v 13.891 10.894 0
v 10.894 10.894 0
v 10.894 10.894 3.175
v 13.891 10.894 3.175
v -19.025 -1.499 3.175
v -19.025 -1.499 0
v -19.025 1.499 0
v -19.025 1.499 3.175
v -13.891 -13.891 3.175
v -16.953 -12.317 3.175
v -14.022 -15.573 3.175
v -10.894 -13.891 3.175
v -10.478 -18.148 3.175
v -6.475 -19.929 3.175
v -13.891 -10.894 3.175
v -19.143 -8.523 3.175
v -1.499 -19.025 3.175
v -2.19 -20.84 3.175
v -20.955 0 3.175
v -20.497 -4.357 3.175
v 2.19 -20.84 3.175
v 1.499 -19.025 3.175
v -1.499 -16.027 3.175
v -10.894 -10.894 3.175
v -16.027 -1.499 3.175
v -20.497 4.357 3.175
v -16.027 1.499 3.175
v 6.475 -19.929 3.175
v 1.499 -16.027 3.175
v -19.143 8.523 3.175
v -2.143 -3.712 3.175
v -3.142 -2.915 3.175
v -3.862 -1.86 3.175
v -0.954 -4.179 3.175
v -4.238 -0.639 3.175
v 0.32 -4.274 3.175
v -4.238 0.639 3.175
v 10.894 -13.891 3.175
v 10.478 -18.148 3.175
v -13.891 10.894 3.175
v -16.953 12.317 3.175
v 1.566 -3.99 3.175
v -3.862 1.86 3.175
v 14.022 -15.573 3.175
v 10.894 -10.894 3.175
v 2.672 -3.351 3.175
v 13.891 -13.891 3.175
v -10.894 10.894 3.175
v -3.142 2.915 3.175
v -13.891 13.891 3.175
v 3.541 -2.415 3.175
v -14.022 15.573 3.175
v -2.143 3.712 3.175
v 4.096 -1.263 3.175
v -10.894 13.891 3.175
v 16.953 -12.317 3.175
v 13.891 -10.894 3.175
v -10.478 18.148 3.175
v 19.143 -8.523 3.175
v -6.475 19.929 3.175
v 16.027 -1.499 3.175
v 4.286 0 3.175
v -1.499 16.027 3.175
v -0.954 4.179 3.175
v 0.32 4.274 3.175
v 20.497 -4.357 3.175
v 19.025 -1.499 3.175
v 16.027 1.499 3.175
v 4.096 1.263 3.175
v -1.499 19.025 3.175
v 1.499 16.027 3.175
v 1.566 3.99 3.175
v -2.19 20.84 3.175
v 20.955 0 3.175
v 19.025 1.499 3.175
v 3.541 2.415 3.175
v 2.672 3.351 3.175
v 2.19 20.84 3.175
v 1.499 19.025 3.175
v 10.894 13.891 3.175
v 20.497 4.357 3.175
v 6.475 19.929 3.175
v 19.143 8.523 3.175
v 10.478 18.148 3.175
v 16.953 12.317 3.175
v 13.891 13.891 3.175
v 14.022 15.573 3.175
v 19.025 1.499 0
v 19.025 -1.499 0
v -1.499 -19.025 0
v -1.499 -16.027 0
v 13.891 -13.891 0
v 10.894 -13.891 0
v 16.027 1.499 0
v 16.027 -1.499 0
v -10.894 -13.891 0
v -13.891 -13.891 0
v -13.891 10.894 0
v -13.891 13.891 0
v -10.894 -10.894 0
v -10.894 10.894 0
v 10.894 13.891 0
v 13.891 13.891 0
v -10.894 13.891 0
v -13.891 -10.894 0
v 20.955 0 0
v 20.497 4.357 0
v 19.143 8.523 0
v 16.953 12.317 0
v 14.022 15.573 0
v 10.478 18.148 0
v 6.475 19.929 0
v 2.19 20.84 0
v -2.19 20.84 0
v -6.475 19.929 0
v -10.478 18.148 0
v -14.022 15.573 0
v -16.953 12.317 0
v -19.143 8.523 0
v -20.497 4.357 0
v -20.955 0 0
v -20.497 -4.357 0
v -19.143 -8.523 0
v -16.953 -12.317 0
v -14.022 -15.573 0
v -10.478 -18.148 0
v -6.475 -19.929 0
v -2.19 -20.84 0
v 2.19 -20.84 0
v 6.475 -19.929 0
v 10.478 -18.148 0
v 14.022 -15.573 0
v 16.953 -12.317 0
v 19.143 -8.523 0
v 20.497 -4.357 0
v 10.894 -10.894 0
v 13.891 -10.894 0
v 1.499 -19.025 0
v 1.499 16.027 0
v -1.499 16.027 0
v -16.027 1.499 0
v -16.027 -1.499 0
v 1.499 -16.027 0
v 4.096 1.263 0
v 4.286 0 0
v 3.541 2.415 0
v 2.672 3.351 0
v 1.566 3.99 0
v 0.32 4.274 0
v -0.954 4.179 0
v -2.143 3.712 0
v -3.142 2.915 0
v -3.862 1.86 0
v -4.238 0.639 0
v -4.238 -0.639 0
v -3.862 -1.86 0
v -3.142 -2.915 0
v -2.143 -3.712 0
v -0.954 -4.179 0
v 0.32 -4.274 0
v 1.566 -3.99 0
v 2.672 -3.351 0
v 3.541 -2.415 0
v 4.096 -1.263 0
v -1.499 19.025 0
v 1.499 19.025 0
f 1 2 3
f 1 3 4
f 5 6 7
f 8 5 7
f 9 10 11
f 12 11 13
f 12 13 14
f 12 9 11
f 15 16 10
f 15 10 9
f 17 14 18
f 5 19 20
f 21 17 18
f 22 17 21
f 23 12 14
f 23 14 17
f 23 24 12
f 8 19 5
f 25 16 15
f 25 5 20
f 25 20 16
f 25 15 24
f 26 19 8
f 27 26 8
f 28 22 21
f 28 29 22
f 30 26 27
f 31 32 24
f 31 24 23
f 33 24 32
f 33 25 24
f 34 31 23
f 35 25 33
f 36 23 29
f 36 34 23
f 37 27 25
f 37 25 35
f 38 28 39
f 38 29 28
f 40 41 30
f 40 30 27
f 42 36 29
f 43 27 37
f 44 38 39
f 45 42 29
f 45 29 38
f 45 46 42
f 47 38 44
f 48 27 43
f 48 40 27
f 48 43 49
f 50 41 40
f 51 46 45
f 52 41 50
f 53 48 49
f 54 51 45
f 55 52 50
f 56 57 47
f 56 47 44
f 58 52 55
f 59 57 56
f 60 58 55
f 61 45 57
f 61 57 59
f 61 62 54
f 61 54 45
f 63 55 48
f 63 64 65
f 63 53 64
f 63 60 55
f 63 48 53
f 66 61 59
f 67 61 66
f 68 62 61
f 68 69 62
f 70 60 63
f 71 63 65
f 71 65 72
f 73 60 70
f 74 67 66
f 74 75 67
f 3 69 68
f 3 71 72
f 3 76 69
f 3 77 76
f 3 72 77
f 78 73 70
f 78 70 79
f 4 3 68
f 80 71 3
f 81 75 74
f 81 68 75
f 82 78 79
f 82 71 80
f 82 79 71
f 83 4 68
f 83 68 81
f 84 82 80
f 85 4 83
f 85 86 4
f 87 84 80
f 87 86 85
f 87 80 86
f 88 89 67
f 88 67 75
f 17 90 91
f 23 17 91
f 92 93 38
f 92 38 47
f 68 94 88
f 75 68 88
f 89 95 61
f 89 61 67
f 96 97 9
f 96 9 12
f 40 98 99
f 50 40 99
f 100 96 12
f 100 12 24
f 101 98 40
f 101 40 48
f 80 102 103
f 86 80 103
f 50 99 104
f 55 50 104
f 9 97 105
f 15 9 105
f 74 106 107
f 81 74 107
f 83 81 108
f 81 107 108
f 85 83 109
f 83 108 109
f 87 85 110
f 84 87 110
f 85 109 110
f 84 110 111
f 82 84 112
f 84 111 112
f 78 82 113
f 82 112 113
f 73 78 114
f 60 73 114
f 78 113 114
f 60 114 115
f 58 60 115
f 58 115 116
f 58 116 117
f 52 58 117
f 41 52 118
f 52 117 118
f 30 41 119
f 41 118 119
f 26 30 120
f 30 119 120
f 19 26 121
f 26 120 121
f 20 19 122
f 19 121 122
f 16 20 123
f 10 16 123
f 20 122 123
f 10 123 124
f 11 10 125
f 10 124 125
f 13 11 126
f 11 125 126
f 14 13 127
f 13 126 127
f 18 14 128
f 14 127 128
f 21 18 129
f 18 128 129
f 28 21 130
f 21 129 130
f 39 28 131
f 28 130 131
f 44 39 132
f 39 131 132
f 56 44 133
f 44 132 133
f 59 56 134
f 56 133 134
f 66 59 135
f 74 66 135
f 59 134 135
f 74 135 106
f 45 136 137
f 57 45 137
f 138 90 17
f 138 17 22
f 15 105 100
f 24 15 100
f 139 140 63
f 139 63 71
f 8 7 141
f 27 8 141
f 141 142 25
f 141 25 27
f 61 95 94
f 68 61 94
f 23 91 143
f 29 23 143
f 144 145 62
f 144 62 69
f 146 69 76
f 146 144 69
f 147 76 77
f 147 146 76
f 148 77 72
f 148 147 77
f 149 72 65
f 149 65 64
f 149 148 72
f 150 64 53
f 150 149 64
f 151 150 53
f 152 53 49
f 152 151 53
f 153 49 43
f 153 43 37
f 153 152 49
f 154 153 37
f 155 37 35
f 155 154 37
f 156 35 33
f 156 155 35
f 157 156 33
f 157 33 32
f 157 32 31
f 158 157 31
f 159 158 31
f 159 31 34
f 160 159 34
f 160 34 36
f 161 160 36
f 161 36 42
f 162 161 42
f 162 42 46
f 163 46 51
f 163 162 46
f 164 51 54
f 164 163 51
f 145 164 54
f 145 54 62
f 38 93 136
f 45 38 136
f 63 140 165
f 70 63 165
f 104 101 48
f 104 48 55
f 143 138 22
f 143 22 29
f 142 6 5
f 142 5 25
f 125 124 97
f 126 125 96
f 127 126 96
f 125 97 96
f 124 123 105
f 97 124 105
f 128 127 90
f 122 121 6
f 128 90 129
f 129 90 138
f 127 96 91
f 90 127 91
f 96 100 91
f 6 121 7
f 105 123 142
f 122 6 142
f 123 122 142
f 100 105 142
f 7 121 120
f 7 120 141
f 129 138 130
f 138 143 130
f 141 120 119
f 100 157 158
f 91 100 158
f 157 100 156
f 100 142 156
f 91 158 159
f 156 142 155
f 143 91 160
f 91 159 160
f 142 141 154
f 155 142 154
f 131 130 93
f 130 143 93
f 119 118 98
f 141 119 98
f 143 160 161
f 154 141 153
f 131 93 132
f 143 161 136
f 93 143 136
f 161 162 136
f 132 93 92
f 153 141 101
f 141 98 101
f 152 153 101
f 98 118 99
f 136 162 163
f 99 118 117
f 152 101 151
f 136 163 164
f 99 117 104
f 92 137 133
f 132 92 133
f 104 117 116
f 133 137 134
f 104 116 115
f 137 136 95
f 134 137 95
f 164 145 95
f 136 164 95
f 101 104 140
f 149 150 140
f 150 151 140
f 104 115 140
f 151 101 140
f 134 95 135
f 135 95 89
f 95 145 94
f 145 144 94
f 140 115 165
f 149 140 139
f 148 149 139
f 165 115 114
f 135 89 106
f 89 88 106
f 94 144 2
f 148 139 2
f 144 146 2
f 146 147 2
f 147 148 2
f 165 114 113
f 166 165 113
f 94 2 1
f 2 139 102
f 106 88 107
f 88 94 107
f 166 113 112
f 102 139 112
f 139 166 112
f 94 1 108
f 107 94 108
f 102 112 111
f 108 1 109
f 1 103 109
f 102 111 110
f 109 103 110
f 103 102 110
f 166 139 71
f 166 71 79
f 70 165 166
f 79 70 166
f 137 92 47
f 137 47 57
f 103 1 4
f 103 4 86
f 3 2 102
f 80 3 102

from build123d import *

# Parameters (mm, degrees)
SKETCH1_R              = 20.955
SKETCH1_W              = 2.9972
SKETCH1_H              = 2.9972
BOSS_EXTRUDE1_DEPTH    = 3.175
CUT_EXTRUDE1_OUTLINE_R = 4.28625
CUT_EXTRUDE1_DEPTH     = 3.175


# Read off the part's stored shape, not the designer's step: Cut-Extrude1
with BuildPart() as part:
    # Sketch1 → Boss-Extrude1 (new body)
    with BuildSketch(Plane.XY):
        Circle(SKETCH1_R)
        with Locations((0, 17.526)):
            Rectangle(SKETCH1_W, SKETCH1_H, mode=Mode.SUBTRACT)
        with Locations((0, -17.526)):
            Rectangle(SKETCH1_W, SKETCH1_H, mode=Mode.SUBTRACT)
        with Locations((-17.526, 0)):
            Rectangle(SKETCH1_W, SKETCH1_H, mode=Mode.SUBTRACT)
        with Locations((17.526, 0)):
            Rectangle(SKETCH1_W, SKETCH1_H, mode=Mode.SUBTRACT)
        with Locations((-12.392753447, 12.392753447)):
            Rectangle(SKETCH1_W, SKETCH1_H, mode=Mode.SUBTRACT)
        with Locations((12.392753447, 12.392753447)):
            Rectangle(SKETCH1_W, SKETCH1_H, mode=Mode.SUBTRACT)
        with Locations((-12.392753447, -12.392753447)):
            Rectangle(SKETCH1_W, SKETCH1_H, mode=Mode.SUBTRACT)
        with Locations((12.392753447, -12.392753447)):
            Rectangle(SKETCH1_W, SKETCH1_H, mode=Mode.SUBTRACT)
    extrude(amount=BOSS_EXTRUDE1_DEPTH)

    # Cut-Extrude1 outline → Cut-Extrude1 (cut)
    with BuildSketch(Plane.XY):
        Circle(CUT_EXTRUDE1_OUTLINE_R)
    extrude(amount=CUT_EXTRUDE1_DEPTH, mode=Mode.SUBTRACT)


solid = part.part
